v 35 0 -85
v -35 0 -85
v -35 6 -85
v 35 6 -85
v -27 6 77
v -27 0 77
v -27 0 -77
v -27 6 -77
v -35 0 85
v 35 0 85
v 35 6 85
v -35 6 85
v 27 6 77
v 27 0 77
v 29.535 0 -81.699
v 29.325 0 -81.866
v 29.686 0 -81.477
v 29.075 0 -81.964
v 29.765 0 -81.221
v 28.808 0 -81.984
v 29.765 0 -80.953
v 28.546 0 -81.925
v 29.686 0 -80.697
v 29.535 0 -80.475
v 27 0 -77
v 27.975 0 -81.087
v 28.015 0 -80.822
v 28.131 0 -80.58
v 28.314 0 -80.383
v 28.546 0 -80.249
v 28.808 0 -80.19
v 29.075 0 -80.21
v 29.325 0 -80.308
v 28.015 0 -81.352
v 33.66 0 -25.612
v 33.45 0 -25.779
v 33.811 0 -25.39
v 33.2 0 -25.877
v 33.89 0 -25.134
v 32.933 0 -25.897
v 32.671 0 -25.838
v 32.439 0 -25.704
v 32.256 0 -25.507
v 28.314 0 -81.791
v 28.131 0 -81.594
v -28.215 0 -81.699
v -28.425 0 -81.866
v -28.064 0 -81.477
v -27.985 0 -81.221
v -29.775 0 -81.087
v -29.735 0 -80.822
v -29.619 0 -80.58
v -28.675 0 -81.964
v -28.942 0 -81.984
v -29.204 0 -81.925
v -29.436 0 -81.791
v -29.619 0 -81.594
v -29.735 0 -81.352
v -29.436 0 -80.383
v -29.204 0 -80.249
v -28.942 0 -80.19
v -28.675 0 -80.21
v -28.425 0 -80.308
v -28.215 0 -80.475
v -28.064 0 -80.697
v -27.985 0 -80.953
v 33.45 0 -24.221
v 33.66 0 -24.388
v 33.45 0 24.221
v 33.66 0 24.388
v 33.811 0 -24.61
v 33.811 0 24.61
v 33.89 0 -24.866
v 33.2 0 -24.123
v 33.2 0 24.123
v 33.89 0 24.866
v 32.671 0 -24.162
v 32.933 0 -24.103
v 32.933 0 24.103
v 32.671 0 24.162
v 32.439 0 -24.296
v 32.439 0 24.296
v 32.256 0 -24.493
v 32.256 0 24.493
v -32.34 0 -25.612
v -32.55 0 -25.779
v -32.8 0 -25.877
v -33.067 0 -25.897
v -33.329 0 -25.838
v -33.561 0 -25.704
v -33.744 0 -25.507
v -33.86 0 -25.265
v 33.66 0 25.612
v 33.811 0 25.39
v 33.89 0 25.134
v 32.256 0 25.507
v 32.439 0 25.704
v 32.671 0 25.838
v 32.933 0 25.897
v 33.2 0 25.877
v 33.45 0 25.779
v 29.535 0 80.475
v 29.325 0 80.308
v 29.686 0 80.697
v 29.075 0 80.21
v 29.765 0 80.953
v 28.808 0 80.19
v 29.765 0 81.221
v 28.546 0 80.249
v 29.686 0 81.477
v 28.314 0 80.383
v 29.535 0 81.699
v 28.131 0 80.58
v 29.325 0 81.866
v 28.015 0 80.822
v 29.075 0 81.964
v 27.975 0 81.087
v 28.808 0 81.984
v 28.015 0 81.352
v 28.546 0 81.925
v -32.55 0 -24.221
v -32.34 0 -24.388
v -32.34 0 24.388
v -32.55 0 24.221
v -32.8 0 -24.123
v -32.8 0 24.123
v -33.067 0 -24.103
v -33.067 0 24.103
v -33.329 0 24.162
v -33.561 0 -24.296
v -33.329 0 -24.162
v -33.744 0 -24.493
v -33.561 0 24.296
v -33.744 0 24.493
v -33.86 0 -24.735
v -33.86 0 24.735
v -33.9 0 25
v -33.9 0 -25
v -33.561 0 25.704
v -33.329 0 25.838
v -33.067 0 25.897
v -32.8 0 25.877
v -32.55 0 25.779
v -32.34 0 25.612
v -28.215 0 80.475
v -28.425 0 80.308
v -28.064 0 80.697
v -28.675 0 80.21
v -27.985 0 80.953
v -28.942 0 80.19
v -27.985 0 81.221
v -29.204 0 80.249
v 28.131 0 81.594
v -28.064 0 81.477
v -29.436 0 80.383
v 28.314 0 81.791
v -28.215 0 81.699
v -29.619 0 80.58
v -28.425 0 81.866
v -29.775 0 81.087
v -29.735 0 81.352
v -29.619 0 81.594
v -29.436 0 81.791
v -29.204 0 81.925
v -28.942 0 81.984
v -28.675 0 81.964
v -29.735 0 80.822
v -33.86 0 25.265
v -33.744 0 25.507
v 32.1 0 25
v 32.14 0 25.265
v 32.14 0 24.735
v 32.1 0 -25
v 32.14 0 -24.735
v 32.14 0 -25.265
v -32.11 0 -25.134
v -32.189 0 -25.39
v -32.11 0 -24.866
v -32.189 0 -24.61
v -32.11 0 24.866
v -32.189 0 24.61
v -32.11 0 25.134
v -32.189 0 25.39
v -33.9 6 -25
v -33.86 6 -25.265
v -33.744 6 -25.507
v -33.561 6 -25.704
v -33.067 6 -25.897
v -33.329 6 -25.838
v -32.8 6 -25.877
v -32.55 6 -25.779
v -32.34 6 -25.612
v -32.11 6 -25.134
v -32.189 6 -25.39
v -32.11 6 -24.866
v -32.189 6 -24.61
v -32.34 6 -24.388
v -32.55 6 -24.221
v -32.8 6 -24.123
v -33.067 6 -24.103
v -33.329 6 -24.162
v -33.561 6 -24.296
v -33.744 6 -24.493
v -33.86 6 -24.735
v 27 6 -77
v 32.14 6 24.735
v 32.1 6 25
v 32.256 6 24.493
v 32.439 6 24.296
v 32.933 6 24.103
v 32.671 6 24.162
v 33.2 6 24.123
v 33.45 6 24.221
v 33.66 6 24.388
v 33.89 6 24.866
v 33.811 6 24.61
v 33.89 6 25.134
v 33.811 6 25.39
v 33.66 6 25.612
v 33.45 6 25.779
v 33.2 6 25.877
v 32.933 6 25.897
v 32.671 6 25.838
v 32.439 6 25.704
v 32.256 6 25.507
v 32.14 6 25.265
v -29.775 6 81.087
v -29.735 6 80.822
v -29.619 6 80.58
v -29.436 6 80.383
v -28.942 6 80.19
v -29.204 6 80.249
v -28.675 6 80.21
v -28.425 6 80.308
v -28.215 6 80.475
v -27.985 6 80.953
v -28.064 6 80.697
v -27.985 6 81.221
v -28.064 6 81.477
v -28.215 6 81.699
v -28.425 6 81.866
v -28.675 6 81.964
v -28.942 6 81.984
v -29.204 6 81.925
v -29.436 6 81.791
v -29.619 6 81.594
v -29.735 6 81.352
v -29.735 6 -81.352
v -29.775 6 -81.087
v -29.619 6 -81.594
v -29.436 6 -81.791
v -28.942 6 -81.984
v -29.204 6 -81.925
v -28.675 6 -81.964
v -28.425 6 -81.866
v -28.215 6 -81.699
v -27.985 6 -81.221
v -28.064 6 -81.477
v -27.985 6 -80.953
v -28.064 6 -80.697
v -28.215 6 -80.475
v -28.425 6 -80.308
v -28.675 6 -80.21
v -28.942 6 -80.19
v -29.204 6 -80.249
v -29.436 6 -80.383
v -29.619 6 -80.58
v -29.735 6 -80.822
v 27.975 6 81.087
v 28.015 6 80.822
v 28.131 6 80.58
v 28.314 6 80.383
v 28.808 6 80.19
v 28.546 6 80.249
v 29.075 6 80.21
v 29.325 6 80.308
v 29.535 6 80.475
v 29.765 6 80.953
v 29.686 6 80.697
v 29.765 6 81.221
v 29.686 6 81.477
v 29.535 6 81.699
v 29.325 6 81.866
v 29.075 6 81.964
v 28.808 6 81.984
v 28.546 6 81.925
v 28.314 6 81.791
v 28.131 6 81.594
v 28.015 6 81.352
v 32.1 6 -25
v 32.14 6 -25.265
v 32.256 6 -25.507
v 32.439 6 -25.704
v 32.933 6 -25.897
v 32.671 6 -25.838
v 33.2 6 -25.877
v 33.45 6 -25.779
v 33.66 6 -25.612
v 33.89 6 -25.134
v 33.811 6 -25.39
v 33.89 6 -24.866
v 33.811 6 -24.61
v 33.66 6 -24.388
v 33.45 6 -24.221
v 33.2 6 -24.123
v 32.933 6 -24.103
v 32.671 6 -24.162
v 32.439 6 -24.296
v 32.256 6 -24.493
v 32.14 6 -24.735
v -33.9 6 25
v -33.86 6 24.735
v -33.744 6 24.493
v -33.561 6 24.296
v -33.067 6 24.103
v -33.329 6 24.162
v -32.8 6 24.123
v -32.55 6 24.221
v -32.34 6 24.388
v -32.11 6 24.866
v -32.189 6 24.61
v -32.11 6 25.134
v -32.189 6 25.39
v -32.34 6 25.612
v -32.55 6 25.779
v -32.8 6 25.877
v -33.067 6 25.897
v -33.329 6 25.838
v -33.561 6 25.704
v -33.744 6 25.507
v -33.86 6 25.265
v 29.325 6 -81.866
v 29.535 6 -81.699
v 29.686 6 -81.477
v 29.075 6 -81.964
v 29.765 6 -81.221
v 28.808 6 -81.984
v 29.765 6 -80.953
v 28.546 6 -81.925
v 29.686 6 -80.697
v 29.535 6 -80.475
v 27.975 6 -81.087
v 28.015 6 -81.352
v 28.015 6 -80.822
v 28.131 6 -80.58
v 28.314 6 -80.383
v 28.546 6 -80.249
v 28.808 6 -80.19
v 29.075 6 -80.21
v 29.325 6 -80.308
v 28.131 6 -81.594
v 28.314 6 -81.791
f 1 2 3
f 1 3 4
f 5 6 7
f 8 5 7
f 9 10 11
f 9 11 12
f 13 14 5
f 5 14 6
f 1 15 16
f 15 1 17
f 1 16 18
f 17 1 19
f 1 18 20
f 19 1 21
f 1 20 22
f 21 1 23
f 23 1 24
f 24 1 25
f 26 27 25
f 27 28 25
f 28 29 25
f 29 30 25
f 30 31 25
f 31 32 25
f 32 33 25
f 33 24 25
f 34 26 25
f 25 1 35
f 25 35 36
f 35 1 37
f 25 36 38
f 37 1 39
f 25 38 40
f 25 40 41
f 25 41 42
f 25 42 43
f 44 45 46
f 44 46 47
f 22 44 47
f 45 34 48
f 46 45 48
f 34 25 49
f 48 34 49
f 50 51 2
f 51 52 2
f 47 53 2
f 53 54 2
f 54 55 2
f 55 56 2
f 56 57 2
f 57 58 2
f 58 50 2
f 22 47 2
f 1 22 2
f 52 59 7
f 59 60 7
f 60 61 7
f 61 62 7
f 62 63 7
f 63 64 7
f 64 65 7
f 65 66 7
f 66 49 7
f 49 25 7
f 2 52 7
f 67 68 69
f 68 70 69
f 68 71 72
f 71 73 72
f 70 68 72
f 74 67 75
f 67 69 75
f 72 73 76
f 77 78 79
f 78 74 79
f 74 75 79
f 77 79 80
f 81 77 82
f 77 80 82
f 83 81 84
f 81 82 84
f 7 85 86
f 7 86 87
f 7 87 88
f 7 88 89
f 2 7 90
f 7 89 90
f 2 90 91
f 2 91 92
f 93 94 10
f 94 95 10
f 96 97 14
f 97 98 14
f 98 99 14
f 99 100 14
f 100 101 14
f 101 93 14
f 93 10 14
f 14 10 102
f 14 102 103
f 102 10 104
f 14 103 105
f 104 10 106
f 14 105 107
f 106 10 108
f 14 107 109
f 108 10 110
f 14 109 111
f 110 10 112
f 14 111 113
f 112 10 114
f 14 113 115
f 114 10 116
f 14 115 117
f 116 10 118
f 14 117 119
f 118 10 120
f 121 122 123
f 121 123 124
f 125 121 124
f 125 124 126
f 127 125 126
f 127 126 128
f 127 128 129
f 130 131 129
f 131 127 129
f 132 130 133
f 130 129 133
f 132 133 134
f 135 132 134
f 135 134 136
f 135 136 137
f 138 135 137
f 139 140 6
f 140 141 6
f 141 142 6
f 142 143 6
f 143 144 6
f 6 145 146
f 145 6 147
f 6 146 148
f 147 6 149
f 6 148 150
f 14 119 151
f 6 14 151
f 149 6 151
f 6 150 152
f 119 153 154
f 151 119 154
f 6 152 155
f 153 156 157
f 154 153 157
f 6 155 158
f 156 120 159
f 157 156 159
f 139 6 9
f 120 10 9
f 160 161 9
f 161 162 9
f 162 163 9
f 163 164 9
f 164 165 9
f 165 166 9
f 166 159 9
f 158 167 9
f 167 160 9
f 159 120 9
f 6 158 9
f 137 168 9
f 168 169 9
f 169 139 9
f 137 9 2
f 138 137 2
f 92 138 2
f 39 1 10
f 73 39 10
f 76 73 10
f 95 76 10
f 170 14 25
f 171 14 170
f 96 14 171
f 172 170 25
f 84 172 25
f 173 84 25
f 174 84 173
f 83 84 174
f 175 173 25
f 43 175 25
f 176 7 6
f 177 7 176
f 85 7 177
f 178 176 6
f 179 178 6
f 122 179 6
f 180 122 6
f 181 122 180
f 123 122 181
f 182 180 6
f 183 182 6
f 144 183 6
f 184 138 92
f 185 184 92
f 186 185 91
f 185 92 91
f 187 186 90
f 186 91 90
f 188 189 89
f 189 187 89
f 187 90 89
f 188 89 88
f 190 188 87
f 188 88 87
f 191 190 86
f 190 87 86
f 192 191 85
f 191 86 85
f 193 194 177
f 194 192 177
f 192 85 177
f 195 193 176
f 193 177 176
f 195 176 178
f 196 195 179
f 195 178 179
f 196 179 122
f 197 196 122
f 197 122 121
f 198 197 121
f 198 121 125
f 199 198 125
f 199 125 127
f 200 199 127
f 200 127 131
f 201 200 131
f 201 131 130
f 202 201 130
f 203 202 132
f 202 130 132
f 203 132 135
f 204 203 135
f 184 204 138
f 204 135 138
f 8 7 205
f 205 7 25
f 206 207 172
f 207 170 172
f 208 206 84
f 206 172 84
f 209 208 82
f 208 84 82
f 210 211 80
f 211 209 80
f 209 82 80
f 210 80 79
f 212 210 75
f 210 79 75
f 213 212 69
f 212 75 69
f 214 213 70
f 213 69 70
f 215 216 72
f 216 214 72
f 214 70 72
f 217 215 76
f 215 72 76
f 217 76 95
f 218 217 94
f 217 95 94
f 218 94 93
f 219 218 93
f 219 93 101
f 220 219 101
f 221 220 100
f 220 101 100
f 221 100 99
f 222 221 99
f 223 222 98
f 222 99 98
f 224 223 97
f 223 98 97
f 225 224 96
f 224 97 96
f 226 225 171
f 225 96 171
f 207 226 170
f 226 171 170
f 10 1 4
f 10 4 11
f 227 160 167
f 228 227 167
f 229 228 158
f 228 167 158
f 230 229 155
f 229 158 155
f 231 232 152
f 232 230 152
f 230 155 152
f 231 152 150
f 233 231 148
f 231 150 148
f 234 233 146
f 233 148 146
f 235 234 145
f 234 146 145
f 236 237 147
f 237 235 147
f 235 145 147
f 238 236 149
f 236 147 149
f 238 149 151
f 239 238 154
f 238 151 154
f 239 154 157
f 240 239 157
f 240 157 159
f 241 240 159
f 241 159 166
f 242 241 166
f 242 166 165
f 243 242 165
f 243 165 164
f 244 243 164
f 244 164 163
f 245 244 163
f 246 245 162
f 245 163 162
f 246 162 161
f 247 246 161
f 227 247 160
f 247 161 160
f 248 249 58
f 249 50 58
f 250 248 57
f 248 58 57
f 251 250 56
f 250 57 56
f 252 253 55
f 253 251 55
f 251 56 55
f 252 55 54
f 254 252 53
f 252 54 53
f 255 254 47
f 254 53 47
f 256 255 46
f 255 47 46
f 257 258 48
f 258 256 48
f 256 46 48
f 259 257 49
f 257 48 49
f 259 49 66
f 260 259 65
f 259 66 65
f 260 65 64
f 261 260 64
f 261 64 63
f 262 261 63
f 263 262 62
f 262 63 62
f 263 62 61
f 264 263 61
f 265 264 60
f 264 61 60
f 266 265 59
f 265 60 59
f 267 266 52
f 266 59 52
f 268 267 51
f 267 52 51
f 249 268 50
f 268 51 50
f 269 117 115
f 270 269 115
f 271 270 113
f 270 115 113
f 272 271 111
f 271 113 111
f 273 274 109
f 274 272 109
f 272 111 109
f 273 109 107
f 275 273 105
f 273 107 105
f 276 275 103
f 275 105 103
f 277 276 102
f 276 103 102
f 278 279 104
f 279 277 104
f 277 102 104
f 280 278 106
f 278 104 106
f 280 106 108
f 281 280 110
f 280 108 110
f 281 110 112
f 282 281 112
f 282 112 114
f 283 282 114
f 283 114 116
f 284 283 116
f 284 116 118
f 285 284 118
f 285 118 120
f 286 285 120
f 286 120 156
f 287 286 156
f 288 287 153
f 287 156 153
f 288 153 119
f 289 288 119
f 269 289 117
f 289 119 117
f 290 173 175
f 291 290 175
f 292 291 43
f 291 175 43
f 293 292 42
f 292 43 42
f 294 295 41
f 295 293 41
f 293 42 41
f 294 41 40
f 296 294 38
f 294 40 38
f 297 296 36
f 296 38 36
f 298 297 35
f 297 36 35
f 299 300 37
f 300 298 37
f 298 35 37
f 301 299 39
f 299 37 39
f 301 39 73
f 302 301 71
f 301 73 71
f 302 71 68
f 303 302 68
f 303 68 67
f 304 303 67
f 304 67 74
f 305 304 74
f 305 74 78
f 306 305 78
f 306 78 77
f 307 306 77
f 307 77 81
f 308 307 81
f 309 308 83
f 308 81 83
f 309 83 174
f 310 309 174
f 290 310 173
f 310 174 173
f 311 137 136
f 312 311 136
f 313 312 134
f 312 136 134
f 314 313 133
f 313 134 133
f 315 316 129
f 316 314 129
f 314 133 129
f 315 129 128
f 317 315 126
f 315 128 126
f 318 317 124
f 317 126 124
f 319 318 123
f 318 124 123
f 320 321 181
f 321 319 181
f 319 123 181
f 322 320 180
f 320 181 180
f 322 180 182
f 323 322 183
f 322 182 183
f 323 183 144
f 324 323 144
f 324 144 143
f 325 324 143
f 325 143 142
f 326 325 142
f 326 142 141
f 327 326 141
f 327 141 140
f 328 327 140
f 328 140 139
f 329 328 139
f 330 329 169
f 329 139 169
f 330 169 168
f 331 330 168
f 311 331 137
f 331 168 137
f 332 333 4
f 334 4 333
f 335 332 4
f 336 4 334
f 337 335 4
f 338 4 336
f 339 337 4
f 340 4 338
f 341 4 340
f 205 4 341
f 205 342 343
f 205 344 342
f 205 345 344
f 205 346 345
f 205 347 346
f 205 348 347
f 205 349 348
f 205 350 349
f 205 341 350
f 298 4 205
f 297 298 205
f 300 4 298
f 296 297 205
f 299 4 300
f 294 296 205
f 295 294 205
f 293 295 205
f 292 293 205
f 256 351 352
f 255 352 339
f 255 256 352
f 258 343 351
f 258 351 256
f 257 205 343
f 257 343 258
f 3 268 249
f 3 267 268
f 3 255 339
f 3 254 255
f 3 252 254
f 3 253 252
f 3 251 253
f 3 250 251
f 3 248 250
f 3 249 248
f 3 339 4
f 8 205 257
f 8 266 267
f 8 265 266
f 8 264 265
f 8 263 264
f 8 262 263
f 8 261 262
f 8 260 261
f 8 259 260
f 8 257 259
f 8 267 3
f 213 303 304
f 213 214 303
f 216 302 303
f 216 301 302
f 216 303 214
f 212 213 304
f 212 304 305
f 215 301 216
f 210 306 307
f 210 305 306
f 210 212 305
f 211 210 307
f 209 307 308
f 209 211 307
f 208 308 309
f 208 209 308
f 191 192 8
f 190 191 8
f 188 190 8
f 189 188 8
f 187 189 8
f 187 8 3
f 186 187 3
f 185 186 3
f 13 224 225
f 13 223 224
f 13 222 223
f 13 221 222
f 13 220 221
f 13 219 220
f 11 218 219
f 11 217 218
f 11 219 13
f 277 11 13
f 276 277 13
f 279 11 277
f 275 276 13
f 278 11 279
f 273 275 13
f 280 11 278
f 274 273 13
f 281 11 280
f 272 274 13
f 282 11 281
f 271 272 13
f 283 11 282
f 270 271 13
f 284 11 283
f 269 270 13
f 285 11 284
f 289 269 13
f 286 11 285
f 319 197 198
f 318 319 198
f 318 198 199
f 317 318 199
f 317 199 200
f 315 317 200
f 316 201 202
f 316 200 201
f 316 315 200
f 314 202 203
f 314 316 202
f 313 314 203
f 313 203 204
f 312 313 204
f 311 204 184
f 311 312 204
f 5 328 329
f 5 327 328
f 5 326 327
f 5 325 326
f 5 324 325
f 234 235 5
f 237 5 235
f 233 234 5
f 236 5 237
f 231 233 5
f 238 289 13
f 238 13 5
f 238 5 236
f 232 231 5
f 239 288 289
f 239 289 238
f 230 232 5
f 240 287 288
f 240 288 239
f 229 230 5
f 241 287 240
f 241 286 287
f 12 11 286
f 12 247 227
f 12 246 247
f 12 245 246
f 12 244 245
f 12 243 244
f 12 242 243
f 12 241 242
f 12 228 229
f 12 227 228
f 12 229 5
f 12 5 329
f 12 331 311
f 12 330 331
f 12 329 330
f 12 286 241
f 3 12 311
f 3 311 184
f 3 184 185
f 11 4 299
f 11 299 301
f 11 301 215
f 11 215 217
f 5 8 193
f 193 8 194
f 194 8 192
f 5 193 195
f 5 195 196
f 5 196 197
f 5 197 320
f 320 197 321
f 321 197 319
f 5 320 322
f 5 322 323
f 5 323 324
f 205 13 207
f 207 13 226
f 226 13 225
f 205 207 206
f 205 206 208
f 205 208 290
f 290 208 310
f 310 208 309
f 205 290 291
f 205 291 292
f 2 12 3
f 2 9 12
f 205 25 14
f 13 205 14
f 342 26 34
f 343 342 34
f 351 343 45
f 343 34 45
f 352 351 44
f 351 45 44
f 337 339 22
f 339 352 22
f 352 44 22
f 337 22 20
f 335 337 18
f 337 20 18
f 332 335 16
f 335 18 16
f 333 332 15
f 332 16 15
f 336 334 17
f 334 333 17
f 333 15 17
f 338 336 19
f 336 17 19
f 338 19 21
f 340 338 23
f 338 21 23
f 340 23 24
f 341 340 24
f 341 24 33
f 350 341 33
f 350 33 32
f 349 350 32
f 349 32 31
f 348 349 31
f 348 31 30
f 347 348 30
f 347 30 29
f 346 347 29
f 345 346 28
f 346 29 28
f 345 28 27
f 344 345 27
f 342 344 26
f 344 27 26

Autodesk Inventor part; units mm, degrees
ref_plane "YZ Plane" through (0, 0, 0) normal (1, 0, 0) x (0, 1, 0)
ref_plane "XZ Plane" through (0, 0, 0) normal (0, 1, 0) x (-1, 0, 0)
ref_plane "XY Plane" through (0, 0, 0) normal (0, 0, 1) x (1, 0, 0)
sketch "Sketch1" plane through (0, 0, 0) normal (0, 1, 0) x (-1, 0, 0)
  line L0 (-27, 77) -> (27, 77)
  line L1 (27, 77) -> (27, -77)
  line L2 (27, -77) -> (-27, -77)
  line L3 (-27, -77) -> (-27, 77)
  line L4 (-27, 77) -> (27, -77) construction
  line L5 (27, 77) -> (-27, -77) construction
  line L6 (-35, 85) -> (35, 85)
  line L7 (35, 85) -> (35, -85)
  line L8 (35, -85) -> (-35, -85)
  line L9 (-35, -85) -> (-35, 85)
  line L10 (-35, 85) -> (35, -85) construction
  line L11 (35, 85) -> (-35, -85) construction
  circle A0 centre (28.875, -81.087) radius 0.9
  circle A1 centre (33, -25) radius 0.9
  line L12 (0, 0) -> (0, -26.4871)
  line L13 (0, 0) -> (15.9434, 0)
  circle A2 centre (-28.875, -81.087) radius 0.9
  circle A3 centre (-33, -25) radius 0.9
  circle A4 centre (28.875, 81.087) radius 0.9
  circle A5 centre (33, 25) radius 0.9
  circle A6 centre (-28.875, 81.087) radius 0.9
  circle A7 centre (-33, 25) radius 0.9
  dimension "d0" = 8
  dimension "d1" = 8
  dimension "d2" = 70
  dimension "d3" = 170
  dimension "d6" = 1.8
  dimension "d7" = 1.8
  dimension "d8" = 57.75
  dimension "d9" = 33
  dimension "d10" = 25
extrude "Extrusion1" add sketch "Sketch1" along normal blind 6
equation "\"d1\" = d0"
properties part number "case_top_cover_slot" material "Acrylic, Clear"
